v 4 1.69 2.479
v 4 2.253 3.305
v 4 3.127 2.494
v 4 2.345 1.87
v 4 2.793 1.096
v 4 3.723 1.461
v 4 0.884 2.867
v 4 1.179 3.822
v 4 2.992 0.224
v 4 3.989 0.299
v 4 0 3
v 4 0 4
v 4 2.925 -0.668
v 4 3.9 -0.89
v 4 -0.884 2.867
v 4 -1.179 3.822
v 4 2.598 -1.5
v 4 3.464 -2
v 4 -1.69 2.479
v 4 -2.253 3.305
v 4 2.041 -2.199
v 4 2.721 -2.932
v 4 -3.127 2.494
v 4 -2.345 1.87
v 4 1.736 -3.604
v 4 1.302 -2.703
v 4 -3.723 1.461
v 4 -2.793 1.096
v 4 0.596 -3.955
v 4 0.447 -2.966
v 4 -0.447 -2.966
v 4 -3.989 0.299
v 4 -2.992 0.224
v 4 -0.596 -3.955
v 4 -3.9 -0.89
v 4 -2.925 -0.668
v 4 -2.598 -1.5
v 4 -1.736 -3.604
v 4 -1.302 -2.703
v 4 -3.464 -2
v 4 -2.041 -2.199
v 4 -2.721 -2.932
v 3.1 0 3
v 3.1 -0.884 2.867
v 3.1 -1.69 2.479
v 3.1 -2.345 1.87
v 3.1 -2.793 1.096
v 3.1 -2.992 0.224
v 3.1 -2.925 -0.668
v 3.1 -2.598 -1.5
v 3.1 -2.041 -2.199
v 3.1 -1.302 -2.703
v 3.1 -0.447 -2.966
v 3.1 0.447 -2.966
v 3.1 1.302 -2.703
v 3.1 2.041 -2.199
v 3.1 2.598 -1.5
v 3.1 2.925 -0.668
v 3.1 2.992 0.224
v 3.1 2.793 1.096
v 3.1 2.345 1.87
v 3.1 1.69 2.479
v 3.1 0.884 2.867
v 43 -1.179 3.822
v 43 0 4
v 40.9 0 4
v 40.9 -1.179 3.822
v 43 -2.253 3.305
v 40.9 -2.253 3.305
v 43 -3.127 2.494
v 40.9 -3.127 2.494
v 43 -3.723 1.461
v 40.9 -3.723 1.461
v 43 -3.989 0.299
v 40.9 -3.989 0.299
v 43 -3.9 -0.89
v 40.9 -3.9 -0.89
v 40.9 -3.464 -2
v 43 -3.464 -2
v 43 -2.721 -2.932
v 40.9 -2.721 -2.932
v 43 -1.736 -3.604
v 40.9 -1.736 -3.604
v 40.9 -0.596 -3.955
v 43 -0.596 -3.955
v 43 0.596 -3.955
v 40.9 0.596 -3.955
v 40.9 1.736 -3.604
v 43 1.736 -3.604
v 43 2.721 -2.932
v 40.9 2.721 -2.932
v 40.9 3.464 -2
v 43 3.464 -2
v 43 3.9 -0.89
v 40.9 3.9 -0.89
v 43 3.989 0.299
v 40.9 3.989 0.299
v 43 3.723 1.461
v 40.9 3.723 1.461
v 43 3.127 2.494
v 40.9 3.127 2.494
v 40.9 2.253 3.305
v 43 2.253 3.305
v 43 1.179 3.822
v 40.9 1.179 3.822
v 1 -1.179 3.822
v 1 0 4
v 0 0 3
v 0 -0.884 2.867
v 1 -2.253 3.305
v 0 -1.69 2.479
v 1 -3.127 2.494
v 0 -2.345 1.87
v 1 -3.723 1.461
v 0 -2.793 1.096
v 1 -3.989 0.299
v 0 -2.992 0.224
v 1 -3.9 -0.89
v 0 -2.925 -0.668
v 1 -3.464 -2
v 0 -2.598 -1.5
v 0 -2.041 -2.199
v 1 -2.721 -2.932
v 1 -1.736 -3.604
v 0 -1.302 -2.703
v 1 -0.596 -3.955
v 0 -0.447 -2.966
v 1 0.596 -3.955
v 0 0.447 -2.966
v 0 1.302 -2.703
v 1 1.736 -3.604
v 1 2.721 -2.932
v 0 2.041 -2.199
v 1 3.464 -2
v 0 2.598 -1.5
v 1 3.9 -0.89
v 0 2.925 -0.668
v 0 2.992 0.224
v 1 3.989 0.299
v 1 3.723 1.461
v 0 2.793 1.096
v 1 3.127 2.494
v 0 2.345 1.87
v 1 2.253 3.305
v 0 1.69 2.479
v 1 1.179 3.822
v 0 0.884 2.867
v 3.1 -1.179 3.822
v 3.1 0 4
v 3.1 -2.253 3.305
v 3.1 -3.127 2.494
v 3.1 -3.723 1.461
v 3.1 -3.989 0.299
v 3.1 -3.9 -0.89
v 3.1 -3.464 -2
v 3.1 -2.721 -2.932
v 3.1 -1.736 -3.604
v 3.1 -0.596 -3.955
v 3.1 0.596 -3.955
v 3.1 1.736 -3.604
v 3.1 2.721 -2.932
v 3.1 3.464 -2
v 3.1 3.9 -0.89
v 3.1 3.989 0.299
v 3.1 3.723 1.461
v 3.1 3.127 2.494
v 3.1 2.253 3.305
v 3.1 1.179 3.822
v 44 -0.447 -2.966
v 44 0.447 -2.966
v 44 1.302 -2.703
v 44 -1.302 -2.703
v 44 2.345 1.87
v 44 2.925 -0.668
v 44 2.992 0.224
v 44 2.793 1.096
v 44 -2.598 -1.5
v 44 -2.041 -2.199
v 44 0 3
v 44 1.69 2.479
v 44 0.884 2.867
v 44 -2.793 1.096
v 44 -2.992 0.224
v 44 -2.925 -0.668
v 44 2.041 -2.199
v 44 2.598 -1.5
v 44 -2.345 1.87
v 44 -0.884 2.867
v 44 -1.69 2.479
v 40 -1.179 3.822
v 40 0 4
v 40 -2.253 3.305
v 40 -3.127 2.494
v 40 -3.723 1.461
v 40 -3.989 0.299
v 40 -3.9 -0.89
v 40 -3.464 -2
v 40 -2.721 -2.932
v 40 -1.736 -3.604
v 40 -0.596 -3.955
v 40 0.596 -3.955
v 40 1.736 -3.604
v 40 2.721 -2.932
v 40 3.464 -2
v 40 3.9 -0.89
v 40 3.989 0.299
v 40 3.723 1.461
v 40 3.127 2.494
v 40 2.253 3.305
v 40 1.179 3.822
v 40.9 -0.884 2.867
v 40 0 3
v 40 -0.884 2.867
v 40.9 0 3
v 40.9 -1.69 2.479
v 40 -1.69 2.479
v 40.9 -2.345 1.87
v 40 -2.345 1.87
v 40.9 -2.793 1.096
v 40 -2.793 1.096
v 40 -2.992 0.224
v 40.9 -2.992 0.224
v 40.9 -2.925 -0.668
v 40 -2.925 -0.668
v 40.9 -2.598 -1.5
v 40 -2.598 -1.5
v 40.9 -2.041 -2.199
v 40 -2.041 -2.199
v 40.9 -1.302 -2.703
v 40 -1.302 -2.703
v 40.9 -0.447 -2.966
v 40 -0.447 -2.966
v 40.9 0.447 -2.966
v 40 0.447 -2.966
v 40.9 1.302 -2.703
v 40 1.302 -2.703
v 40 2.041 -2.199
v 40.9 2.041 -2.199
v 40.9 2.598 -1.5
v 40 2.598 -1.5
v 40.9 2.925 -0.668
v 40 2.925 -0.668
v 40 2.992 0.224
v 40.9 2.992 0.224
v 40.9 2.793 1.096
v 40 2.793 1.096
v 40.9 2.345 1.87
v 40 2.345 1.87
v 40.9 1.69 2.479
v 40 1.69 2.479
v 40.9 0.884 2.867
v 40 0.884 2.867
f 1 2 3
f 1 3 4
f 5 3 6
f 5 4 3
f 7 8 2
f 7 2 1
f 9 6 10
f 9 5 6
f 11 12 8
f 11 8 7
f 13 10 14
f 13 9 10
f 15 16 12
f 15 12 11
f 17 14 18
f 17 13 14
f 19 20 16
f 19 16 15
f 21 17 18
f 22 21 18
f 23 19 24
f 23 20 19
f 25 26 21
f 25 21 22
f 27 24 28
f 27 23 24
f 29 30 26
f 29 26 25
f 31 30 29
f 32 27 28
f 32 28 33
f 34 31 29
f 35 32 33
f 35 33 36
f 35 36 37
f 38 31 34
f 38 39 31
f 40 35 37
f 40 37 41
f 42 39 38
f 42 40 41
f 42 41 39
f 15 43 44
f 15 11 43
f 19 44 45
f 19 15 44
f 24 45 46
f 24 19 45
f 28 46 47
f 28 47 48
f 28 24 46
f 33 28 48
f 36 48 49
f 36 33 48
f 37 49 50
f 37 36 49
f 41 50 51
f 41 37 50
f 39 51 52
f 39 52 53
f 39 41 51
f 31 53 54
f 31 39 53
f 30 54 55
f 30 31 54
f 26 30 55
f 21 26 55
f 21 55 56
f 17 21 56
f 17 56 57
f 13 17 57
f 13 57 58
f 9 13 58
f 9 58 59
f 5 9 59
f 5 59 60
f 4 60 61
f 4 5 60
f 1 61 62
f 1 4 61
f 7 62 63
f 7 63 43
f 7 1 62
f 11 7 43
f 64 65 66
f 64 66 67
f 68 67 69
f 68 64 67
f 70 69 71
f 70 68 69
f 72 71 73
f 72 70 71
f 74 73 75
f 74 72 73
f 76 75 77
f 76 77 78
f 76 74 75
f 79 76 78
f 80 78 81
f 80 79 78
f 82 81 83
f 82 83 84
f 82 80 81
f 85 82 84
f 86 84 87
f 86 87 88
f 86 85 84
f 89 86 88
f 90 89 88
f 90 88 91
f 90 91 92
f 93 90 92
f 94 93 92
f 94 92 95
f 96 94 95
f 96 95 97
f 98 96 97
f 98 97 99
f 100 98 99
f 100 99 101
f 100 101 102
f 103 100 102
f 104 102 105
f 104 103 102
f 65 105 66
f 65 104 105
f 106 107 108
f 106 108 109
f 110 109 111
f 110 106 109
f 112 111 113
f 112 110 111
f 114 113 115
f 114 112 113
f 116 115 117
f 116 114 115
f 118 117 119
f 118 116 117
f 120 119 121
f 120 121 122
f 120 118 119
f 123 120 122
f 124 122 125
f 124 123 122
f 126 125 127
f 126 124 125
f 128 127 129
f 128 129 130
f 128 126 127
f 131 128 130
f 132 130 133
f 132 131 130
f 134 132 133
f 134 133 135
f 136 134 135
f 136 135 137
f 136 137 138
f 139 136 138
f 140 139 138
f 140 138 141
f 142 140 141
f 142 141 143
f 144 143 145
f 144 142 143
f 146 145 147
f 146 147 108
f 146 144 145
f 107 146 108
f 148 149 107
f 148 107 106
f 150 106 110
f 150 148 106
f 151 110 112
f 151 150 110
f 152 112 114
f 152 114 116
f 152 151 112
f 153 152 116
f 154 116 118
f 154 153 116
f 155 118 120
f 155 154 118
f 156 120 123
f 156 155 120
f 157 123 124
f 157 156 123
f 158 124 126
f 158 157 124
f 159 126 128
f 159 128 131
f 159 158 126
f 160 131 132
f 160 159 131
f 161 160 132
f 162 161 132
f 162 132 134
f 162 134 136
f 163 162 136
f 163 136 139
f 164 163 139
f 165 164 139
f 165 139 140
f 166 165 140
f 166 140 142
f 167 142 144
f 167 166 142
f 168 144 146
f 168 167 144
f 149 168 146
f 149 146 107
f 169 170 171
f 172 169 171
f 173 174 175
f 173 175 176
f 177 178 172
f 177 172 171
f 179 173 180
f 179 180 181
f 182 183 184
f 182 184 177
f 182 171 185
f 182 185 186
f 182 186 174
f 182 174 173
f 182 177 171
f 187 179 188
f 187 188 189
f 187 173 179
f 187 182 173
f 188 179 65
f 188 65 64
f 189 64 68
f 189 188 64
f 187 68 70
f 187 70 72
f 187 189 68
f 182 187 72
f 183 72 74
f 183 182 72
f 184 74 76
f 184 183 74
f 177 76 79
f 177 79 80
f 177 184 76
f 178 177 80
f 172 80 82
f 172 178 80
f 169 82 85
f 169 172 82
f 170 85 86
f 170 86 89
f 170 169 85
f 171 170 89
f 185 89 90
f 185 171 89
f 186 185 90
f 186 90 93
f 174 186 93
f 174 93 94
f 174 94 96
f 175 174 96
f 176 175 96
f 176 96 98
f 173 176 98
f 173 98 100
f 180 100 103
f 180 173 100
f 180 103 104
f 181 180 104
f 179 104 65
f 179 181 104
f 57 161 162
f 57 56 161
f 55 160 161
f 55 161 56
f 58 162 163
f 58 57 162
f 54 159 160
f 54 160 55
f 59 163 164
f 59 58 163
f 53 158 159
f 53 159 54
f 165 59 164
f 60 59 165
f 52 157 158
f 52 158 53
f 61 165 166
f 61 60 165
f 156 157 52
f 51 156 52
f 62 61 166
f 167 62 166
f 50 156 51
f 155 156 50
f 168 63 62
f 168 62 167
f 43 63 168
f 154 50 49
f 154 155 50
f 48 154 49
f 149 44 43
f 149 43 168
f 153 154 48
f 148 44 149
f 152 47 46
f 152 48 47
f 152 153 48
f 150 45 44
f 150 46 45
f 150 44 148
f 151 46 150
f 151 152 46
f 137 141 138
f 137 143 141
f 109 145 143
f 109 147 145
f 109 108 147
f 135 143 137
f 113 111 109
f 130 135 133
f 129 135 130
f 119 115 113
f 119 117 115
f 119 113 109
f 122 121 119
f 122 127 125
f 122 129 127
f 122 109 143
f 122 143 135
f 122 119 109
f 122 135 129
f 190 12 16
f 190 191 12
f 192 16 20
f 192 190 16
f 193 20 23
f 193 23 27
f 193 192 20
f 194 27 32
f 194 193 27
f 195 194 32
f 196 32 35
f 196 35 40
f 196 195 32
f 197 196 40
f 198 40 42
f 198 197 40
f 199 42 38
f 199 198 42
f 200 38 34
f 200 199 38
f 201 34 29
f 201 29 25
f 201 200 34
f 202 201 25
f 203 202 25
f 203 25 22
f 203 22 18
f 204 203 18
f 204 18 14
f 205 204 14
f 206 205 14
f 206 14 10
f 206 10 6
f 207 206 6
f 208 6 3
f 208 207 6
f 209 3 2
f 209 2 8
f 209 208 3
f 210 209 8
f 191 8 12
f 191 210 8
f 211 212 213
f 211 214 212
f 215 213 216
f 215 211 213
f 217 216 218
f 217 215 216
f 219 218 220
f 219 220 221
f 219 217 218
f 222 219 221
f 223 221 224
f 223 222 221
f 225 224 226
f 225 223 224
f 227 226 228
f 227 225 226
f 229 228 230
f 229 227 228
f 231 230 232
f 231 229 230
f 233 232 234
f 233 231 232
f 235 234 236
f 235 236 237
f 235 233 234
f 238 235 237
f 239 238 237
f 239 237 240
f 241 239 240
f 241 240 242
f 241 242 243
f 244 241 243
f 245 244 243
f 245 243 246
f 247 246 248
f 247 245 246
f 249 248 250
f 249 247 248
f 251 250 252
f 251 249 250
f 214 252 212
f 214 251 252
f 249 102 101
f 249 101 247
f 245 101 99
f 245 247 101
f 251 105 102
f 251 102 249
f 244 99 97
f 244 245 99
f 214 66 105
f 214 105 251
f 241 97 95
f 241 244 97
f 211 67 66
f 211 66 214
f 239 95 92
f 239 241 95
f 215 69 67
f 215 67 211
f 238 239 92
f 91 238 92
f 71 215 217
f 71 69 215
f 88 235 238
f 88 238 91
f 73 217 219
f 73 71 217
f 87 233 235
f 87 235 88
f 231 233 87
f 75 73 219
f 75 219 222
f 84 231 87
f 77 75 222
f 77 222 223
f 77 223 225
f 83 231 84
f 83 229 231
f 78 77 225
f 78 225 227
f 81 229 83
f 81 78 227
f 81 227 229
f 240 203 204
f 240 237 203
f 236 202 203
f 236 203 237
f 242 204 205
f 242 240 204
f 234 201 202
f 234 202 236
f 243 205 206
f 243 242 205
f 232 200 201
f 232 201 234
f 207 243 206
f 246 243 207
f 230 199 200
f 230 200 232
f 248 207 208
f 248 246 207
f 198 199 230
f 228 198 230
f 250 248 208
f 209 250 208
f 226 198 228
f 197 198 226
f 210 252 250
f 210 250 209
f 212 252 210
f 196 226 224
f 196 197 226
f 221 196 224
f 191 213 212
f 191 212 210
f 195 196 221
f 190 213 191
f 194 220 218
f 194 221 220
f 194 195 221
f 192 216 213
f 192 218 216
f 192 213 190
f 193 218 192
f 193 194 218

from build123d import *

# Parameters (mm, degrees)
CHAMFER1_SIZE = 1


with BuildPart() as part:
    # Sketch1 → Revolve1 (revolve)
    with BuildSketch(Plane.XY, mode=Mode.PRIVATE) as revolve1_sk:
        Polygon((0, 0), (0, 4), (3.1, 4), (3.1, 3), (4, 3), (4, 4), (40, 4), (40, 3), (40.9, 3), (40.9, 4), (44, 4), (44, 0), align=None)
    revolve(revolve1_sk.sketch.rotate(Axis((0, 0, 0), (1, 0, 0)), 90), axis=Axis((0, 0, 0), (1, 0, 0)))

    # Chamfer1
    chamfer1_edges = [part.edges().sort_by_distance(p)[0] for p in [
        (0, 0, -4),
        (44, 0, -4),
    ]]
    chamfer(chamfer1_edges, length=CHAMFER1_SIZE)


solid = part.part
